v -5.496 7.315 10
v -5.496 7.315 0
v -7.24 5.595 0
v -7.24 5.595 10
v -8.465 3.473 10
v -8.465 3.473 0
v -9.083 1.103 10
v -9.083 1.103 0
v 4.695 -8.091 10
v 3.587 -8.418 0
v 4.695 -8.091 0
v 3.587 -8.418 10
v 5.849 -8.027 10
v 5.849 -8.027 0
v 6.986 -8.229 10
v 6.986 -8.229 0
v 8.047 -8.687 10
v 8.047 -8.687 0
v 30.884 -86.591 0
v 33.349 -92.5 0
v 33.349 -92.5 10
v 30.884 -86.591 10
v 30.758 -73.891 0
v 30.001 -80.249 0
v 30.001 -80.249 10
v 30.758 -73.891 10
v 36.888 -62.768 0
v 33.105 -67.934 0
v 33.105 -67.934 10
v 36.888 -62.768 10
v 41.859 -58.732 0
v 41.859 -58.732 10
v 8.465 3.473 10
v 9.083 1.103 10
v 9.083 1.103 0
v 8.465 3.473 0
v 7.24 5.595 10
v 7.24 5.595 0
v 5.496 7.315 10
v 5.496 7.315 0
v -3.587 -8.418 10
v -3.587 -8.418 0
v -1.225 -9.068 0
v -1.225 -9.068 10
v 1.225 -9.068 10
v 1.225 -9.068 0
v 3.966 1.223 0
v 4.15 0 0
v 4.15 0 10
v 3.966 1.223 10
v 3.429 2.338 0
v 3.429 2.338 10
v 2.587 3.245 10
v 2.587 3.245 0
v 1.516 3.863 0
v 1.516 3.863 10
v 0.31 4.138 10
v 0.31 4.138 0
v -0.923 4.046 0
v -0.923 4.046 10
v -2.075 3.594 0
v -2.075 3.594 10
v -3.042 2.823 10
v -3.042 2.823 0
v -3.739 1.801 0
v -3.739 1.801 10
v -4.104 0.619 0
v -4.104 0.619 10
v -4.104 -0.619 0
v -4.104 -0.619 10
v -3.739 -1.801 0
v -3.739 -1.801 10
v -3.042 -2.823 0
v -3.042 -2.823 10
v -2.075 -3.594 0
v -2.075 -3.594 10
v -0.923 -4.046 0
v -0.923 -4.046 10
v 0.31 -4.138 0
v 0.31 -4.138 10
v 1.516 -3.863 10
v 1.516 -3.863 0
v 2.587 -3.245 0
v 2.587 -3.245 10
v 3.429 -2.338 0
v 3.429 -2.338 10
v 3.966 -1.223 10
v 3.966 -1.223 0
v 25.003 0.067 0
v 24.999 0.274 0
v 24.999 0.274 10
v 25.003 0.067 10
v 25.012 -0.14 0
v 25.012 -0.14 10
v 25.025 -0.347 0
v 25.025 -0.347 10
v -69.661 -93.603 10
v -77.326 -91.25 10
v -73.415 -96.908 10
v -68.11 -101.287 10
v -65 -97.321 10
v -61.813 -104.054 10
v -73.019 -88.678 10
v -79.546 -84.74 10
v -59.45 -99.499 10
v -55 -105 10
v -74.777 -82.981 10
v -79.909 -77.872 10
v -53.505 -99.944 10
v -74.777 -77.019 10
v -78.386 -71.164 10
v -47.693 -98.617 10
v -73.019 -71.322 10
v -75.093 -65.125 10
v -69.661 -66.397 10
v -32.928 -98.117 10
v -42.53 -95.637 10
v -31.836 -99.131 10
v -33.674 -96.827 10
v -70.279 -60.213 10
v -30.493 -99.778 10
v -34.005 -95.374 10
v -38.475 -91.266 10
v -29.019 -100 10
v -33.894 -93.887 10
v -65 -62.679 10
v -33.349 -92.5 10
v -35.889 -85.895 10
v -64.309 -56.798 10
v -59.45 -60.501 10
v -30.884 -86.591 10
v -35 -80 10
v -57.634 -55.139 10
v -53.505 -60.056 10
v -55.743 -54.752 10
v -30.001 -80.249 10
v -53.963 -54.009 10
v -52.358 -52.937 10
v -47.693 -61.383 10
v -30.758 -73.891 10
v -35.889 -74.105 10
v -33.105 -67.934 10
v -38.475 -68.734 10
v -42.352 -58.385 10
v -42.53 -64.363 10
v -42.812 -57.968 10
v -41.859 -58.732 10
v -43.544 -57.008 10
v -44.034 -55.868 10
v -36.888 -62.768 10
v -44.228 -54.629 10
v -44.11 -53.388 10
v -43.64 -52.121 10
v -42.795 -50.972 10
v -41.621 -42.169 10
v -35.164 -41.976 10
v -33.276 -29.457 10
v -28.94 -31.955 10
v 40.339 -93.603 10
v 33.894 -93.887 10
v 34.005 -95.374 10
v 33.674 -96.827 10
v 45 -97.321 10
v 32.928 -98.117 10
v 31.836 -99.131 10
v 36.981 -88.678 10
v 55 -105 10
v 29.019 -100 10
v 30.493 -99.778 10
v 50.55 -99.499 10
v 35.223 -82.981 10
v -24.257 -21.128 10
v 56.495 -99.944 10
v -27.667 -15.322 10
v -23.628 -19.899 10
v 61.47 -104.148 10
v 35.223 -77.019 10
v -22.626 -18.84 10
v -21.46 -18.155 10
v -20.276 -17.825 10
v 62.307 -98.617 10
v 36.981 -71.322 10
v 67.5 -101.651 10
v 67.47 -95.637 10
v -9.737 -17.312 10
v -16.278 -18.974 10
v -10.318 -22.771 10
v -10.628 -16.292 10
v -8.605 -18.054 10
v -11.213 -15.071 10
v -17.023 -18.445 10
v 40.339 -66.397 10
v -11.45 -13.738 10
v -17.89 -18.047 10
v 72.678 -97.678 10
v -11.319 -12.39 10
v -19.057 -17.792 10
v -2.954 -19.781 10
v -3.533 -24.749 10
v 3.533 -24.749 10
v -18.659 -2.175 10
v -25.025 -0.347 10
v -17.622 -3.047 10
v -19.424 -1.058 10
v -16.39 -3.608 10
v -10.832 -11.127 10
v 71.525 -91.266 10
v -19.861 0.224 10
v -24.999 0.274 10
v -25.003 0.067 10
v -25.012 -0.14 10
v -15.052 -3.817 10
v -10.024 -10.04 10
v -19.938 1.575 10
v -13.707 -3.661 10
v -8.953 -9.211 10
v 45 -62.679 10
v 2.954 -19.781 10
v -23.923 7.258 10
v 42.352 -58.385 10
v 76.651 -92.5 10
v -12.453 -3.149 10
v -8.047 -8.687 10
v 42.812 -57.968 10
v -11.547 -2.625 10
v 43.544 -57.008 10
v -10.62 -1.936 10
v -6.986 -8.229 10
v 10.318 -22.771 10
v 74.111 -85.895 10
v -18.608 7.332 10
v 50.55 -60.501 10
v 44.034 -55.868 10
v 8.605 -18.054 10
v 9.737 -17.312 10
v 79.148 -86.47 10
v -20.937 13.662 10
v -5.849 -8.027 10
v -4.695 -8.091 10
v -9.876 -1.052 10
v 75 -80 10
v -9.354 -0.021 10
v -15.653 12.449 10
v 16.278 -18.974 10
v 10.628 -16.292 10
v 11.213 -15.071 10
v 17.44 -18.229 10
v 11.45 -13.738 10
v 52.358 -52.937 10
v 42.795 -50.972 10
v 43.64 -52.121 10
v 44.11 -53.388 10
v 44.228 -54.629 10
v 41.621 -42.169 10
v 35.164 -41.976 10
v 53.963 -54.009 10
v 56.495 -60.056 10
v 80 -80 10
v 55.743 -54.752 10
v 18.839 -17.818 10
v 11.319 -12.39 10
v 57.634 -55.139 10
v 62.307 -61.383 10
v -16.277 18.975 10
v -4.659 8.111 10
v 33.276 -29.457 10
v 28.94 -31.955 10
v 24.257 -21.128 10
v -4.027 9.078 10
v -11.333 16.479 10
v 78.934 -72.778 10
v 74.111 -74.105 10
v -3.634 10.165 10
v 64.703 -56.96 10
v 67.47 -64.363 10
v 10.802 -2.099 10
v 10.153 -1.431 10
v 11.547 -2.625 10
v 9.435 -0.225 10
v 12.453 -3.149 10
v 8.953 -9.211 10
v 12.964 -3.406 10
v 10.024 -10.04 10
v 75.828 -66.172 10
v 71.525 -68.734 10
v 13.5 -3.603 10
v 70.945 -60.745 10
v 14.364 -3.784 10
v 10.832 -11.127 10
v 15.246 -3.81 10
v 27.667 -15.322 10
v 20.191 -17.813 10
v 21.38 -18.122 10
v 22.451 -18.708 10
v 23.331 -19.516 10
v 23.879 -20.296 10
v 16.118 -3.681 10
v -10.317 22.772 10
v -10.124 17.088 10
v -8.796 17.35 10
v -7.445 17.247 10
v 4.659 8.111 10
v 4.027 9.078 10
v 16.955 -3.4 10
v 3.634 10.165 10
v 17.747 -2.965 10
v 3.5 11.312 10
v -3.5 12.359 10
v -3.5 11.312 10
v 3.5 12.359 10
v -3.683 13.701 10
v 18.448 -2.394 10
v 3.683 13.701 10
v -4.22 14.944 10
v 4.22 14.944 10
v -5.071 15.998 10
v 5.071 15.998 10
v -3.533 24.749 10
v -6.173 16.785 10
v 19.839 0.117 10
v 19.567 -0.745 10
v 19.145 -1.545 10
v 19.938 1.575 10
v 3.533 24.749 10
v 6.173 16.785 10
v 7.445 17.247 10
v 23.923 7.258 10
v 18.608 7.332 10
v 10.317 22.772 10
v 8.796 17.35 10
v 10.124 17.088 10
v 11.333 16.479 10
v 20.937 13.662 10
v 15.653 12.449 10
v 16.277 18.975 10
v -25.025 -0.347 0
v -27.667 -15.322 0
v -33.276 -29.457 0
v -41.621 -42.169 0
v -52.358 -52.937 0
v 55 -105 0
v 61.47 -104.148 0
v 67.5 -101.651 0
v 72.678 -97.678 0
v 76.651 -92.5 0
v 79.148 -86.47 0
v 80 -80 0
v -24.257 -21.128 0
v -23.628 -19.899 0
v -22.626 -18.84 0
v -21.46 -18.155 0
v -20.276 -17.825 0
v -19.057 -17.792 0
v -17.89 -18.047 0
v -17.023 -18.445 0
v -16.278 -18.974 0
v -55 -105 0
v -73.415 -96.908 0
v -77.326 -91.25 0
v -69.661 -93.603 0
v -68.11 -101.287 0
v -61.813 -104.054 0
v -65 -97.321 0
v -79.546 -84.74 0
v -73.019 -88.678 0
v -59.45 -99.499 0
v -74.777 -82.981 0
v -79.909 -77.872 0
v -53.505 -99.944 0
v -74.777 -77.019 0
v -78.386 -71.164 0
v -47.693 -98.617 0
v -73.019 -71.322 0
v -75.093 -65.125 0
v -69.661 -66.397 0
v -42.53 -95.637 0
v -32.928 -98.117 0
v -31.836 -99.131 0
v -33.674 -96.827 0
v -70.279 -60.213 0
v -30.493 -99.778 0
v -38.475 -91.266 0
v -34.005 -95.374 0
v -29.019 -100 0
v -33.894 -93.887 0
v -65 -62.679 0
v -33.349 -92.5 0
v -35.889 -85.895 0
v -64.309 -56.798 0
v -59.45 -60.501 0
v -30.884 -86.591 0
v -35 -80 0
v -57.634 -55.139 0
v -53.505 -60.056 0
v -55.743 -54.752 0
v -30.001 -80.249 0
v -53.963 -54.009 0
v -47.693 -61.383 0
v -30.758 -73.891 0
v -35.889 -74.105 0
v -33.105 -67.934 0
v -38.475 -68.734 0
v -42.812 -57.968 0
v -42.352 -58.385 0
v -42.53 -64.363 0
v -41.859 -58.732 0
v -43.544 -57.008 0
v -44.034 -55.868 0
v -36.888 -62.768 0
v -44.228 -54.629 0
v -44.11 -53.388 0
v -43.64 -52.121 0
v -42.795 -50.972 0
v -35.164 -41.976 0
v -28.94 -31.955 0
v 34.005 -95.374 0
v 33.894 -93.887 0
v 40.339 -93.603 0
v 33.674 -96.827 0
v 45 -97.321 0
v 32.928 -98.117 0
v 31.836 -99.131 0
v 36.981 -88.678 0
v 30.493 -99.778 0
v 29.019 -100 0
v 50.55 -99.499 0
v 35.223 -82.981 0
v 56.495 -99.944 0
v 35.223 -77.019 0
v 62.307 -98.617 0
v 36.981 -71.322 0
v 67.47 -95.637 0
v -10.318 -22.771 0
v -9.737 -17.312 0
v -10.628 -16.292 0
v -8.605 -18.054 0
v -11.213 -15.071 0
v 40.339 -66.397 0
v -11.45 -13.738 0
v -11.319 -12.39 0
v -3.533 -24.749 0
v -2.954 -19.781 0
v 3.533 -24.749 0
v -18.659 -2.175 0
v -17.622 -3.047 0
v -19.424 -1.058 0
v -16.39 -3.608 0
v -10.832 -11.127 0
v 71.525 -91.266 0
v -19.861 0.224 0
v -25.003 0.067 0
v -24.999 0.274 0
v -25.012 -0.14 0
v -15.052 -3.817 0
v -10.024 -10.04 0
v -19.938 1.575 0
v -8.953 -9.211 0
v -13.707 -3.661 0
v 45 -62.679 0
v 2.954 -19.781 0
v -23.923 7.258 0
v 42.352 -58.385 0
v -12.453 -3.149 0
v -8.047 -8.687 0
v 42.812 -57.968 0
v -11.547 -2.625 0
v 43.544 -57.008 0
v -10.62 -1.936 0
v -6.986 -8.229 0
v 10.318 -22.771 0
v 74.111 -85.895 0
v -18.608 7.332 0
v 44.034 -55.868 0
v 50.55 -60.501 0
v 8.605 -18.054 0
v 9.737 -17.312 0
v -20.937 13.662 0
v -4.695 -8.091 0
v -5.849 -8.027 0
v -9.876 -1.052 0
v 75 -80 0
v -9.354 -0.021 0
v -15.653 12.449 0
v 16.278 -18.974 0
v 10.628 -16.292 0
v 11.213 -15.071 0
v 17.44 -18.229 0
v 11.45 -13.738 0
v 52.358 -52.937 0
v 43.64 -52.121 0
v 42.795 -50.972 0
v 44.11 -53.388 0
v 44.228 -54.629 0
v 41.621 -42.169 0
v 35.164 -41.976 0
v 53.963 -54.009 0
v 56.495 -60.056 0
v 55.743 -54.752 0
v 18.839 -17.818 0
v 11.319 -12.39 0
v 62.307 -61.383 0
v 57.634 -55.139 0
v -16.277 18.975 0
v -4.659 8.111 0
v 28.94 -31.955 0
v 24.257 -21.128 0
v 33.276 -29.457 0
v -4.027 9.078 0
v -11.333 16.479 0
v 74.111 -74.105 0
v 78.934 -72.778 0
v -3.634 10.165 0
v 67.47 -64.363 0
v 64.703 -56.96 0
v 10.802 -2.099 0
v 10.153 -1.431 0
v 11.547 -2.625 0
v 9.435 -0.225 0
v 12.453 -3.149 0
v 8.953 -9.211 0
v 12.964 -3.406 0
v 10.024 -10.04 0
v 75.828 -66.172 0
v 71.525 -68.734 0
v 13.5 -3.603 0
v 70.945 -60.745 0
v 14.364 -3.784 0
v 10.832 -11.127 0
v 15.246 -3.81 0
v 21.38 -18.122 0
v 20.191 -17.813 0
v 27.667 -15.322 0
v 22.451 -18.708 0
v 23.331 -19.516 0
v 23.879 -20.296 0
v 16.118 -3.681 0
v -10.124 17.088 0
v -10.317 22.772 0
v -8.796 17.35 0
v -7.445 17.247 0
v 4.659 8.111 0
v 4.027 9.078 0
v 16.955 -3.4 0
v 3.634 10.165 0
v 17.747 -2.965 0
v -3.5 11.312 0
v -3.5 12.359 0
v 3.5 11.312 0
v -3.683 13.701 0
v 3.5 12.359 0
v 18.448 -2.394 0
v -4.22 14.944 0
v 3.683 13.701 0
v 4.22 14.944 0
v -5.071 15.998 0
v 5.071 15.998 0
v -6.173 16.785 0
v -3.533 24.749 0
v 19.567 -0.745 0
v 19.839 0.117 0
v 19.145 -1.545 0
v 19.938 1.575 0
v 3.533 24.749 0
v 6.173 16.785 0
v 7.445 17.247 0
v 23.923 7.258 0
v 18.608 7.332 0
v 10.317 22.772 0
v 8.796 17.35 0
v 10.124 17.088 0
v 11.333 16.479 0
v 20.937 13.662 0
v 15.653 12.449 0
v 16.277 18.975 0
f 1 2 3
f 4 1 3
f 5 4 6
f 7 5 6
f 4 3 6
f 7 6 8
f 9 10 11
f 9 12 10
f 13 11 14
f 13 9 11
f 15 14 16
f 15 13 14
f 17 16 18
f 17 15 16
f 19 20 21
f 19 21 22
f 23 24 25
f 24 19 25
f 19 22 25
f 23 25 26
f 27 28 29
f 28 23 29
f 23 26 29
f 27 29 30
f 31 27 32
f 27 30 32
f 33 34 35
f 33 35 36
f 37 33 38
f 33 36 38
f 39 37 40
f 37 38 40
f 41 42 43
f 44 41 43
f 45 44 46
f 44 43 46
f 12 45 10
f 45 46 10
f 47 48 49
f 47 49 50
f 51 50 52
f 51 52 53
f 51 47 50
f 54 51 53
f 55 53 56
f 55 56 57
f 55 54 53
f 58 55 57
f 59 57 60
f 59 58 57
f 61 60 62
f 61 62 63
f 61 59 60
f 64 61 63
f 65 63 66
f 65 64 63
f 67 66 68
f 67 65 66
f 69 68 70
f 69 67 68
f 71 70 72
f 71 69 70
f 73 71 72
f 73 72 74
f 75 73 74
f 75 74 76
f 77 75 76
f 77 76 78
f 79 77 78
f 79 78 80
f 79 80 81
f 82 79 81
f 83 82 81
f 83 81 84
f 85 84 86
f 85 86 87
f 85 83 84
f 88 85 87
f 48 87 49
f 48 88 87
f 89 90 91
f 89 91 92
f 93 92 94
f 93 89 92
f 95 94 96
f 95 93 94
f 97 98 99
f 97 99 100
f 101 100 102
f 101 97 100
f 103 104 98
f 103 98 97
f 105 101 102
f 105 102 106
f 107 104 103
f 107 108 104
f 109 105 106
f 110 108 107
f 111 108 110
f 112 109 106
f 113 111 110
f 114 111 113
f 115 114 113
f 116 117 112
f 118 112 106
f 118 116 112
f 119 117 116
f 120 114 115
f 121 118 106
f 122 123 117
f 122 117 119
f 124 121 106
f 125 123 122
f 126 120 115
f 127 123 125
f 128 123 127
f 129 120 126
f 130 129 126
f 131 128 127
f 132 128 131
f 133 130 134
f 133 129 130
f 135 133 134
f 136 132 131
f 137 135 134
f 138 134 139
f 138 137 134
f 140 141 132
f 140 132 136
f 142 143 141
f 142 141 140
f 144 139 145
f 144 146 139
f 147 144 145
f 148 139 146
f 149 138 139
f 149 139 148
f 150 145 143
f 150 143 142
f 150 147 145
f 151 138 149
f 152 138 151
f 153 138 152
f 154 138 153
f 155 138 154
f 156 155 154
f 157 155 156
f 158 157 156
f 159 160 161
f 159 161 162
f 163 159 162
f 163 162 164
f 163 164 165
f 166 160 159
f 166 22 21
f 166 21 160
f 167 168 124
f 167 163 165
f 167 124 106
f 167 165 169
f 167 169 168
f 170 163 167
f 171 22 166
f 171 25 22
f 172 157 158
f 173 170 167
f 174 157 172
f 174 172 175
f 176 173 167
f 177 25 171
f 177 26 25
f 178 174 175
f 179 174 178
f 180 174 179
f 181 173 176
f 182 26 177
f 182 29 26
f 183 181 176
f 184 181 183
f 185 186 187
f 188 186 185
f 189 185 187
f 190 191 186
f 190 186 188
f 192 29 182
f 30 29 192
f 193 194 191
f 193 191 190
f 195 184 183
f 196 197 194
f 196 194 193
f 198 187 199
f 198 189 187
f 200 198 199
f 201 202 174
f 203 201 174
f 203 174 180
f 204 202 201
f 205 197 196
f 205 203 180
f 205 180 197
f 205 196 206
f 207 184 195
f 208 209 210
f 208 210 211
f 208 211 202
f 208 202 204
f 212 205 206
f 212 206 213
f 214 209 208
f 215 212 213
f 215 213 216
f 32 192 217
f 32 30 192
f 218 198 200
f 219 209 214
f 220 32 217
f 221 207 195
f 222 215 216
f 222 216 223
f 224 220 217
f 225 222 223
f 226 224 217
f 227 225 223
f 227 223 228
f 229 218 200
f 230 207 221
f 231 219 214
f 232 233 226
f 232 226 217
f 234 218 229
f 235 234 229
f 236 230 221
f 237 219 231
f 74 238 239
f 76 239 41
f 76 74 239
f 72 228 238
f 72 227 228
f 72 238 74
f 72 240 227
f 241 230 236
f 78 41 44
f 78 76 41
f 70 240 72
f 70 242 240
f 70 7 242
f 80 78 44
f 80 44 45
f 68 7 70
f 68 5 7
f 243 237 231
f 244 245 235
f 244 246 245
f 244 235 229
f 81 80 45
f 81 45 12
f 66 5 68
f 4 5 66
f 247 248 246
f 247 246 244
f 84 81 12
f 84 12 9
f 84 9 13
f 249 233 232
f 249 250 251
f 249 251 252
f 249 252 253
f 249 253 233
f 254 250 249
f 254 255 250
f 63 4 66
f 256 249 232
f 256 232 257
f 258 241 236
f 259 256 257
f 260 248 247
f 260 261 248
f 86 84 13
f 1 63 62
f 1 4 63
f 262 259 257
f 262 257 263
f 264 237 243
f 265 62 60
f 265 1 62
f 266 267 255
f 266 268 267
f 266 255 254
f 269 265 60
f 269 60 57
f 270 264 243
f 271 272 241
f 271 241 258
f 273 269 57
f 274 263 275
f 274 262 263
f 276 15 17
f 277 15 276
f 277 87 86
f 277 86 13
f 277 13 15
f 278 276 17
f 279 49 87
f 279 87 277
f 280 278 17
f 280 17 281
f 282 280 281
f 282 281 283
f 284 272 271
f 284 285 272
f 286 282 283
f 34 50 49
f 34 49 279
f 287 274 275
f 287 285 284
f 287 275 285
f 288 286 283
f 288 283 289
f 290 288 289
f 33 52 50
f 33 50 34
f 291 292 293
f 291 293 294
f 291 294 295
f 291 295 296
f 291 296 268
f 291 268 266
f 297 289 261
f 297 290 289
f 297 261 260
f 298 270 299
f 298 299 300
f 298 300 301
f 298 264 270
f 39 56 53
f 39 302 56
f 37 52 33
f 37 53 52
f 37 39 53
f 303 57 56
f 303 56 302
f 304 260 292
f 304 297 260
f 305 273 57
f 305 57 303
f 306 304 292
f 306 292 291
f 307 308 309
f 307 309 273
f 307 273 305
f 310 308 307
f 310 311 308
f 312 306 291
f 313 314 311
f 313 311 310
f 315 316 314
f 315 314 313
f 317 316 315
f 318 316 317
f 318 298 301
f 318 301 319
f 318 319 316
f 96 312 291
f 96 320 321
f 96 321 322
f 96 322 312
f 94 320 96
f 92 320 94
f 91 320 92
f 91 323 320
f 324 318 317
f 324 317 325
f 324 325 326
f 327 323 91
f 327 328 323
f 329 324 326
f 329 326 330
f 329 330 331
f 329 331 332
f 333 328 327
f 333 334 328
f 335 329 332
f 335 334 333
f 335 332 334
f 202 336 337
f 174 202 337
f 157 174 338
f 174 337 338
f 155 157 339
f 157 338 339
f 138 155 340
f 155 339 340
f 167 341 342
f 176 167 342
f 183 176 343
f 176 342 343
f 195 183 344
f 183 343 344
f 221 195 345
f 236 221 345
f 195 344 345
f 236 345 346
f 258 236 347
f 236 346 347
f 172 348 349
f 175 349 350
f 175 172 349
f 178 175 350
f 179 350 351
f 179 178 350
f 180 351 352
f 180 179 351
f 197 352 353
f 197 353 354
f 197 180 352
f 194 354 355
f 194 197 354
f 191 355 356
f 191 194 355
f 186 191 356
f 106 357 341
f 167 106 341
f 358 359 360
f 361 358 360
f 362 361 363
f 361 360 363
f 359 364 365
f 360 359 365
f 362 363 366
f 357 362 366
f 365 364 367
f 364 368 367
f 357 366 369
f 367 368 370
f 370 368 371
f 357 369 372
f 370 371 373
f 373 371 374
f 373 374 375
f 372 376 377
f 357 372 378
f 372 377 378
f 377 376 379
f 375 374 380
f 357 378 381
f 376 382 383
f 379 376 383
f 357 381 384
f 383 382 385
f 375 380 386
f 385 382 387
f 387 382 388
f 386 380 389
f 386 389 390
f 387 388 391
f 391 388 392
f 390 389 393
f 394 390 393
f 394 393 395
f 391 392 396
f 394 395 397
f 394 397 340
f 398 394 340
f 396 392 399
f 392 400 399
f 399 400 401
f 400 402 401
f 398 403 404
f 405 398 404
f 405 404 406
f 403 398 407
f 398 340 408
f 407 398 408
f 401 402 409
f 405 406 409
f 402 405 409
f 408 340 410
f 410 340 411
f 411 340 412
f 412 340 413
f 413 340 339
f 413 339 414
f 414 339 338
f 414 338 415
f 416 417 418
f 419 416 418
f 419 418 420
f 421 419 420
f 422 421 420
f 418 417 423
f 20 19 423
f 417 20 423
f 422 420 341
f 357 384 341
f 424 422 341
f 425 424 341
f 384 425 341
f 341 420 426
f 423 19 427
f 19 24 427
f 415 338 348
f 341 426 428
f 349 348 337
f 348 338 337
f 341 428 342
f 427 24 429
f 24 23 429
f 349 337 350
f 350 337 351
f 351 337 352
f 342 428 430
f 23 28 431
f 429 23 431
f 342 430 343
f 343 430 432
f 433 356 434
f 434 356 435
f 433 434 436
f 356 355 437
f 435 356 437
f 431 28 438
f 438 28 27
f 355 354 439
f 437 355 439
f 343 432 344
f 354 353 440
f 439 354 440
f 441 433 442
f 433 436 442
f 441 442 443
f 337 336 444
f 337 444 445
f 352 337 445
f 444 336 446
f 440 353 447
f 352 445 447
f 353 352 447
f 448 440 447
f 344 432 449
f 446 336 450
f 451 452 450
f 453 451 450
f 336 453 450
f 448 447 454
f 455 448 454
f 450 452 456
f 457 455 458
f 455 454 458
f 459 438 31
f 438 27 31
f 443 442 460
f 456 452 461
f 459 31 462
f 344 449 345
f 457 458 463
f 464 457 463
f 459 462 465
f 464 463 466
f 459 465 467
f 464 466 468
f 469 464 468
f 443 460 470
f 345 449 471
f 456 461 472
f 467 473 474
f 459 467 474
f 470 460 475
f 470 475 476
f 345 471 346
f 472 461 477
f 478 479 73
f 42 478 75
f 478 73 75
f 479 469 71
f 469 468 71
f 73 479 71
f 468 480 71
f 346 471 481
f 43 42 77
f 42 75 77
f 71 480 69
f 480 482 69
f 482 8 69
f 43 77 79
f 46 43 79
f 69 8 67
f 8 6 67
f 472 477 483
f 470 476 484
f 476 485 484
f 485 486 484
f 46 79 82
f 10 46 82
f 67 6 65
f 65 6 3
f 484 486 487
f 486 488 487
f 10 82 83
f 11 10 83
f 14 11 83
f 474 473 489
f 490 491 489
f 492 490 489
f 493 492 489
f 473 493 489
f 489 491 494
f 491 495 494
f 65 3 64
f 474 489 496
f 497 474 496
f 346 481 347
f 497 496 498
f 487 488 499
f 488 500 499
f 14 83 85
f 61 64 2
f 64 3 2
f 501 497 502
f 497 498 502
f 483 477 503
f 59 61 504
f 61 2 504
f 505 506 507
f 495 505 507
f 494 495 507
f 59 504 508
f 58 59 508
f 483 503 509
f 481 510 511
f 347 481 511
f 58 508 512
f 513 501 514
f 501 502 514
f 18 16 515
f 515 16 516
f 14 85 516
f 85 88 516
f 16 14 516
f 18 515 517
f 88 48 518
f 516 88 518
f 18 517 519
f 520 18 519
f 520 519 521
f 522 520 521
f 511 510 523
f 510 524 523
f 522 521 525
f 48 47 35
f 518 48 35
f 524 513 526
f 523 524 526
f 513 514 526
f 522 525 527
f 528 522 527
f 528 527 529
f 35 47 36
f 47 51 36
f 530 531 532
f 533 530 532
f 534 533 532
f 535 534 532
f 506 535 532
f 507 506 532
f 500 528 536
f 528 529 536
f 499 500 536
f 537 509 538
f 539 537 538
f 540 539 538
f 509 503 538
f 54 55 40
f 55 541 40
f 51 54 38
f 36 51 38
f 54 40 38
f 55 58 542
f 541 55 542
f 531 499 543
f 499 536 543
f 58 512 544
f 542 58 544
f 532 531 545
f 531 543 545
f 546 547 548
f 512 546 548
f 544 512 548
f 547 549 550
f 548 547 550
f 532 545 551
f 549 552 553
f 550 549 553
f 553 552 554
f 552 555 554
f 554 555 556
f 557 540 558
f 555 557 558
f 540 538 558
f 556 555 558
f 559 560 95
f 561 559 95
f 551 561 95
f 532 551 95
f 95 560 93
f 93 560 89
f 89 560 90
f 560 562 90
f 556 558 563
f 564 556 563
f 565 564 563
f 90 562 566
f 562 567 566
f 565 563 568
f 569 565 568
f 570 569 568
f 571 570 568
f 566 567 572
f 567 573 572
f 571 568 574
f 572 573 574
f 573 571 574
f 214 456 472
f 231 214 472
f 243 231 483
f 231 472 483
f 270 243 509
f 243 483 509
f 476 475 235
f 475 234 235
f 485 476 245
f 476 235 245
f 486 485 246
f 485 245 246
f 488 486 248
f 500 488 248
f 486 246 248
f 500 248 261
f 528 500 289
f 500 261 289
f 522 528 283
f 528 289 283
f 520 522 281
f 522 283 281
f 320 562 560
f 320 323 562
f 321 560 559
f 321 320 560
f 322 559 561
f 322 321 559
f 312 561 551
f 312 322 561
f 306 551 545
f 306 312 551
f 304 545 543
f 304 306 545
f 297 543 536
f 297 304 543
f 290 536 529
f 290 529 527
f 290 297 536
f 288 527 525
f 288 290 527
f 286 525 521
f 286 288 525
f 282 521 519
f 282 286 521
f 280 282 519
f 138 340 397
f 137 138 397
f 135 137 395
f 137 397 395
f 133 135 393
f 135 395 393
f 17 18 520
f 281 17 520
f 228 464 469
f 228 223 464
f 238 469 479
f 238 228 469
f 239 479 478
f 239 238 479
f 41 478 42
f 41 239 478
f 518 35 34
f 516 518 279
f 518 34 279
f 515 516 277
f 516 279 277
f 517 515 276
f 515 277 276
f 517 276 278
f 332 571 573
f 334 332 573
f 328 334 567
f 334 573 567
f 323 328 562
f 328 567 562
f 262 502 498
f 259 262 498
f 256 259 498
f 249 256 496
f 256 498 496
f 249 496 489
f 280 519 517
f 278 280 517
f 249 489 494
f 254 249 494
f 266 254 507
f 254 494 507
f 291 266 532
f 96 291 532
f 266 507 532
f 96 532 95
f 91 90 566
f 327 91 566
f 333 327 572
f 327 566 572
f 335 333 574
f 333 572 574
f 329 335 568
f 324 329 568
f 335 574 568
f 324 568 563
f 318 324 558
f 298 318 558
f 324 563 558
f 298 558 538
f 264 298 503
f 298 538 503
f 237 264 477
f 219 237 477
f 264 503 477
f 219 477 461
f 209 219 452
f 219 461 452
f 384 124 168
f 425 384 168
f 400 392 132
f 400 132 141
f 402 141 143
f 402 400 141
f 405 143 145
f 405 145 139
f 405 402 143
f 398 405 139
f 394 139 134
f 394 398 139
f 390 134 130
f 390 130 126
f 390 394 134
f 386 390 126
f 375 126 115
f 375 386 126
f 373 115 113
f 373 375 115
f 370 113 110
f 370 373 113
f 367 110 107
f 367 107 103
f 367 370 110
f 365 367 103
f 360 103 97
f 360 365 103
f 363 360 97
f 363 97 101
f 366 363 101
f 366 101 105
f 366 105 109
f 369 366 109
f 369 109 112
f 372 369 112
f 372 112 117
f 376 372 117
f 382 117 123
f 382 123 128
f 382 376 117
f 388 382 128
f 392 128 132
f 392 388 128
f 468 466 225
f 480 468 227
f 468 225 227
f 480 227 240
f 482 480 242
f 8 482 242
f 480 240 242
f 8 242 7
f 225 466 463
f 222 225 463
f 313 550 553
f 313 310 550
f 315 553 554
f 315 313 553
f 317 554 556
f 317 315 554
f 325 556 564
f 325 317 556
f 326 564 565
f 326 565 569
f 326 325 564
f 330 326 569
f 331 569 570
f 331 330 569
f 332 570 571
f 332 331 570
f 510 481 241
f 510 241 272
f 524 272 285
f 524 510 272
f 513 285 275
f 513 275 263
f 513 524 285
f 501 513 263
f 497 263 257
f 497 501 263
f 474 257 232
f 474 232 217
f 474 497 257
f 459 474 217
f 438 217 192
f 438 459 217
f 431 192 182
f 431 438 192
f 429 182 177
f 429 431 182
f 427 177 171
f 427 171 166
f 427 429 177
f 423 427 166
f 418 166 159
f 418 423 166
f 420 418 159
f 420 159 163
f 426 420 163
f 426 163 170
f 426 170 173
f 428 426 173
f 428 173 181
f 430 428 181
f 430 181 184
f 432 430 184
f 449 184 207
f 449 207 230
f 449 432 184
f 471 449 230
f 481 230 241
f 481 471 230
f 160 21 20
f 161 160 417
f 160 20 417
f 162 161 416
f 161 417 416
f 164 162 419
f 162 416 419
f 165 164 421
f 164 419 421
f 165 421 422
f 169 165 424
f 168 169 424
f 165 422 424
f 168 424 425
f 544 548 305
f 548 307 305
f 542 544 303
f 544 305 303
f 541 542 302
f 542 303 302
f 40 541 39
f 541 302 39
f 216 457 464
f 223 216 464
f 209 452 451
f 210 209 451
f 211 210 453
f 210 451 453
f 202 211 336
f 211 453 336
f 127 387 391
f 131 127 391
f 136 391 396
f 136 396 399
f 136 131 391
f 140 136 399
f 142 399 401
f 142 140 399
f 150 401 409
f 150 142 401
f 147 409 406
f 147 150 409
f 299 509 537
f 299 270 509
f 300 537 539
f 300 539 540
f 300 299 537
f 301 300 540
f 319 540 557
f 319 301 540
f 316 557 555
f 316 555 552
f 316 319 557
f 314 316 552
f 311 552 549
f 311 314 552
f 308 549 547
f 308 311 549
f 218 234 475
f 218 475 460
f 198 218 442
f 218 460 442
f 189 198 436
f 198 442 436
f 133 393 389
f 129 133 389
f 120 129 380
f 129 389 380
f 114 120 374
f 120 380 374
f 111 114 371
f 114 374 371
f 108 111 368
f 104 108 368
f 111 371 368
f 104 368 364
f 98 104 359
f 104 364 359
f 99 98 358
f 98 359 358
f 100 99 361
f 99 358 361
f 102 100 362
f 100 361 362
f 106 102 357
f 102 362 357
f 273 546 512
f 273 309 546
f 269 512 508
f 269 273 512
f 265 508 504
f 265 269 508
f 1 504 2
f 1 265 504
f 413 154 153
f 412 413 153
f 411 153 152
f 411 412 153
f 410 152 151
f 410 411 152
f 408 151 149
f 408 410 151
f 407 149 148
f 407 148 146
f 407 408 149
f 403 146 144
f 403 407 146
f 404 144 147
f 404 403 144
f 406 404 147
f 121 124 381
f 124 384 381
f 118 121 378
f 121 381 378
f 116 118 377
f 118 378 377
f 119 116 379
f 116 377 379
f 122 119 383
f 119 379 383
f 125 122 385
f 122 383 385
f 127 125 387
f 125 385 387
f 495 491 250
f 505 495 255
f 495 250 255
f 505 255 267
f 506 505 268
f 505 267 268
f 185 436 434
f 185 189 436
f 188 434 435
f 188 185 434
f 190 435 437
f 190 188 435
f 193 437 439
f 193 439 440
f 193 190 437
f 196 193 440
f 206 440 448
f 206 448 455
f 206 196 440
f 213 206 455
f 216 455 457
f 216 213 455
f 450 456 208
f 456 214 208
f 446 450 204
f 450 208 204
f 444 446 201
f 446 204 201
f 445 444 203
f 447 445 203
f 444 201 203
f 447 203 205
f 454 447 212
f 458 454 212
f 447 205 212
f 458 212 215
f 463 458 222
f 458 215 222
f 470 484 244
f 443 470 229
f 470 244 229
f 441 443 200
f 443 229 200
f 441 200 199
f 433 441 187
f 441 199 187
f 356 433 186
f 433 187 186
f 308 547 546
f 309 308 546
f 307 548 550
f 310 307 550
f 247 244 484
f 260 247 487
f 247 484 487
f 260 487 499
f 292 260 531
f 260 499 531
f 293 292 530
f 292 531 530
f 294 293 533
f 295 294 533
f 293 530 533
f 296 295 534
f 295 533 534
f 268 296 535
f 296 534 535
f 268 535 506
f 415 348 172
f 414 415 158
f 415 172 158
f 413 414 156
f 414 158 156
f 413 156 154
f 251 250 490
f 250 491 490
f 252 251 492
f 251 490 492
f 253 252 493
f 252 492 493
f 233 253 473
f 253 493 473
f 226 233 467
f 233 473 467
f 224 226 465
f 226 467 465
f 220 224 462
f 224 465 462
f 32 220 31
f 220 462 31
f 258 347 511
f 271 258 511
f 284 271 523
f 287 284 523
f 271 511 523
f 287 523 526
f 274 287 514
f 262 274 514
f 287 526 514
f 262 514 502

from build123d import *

# Parameters (mm, degrees)
F1_R            = 20
F2_DEPTH        = 10
F3_T            = -5
F4_DEPTH        = 5.001
F1_R_2          = 4.15
F5_DEPTH        = 10
F6_DEPTH        = 10
F6_COPIES_COUNT = 3
F9_R            = 5
F10_T1_DEPTH    = 10
F11_R           = 5


# Not quite as in the source:
# - a fillet or chamfer that OpenCascade refuses, or shapes differently, is made with other operations: its cross-section is extruded or revolved along the edge and cut away or added
# - a feature of the source that left no trace in its solid (it failed there, or was rolled back) is left out
# - a pattern or mirror of a feature is missing from the dataset's text; its kind, count and spacing are read off the source's solid


with BuildPart() as f2:
    # F1 (on Top) → F2 (new body)
    with BuildSketch(Plane.XY):
        with BuildLine():
            ThreePointArc((-25, 0), (0, -25), (25, 0))
            ThreePointArc((25, 0), (0, 25), (-25, 0))
        make_face()
        with BuildLine():
            ThreePointArc((3.5, 19.6913686675), (15.3297097168, 12.8452325787), (20, 0))
            ThreePointArc((20, 0), (-12.8452325787, -15.3297097168), (-3.5, 19.6913686675))
            ThreePointArc((-3.5, 19.6913686675), (0, 20), (3.5, 19.6913686675))
        make_face(mode=Mode.SUBTRACT)
        with BuildLine():
            ThreePointArc((55, -55), (33.982083659, -30.7824998224), (25, 0))
            ThreePointArc((25, 0), (0, -25), (-25, 0))
            ThreePointArc((-25, 0), (-33.982083659, -30.7824998224), (-55, -55))
            ThreePointArc((-55, -55), (-37.3223304703, -62.3223304703), (-30, -80))
            ThreePointArc((-30, -80), (-37.3223304703, -97.6776695297), (-55, -105))
            Line((-55, -105), (55, -105))
            ThreePointArc((55, -105), (30, -80), (55, -55))
        make_face()
        with BuildLine():
            ThreePointArc((80, -80), (72.6776695297, -62.3223304703), (55, -55))
            ThreePointArc((55, -55), (30, -80), (55, -105))
            ThreePointArc((55, -105), (72.6776695297, -97.6776695297), (80, -80))
        make_face()
        with Locations((55, -80)):
            Circle(F1_R, mode=Mode.SUBTRACT)
        with BuildLine():
            ThreePointArc((-30, -80), (-37.3223304703, -62.3223304703), (-55, -55))
            ThreePointArc((-55, -55), (-80, -80), (-55, -105))
            ThreePointArc((-55, -105), (-37.3223304703, -97.6776695297), (-30, -80))
        make_face()
        with Locations((-55, -80)):
            Circle(F1_R, mode=Mode.SUBTRACT)
    extrude(amount=F2_DEPTH)

    # F3
    f3_openings = [f2.faces().sort_by_distance(p)[0] for p in [
        (0, -59.438768, 10),
    ]]
    offset(amount=F3_T, openings=f3_openings)

    # F4 (cut, through all): a face of the model
    f4_faces = [f2.faces().sort_by_distance(p)[0] for p in [
        (0, -60.9945168835, 5),
    ]]
    extrude(f4_faces, amount=-F4_DEPTH, mode=Mode.SUBTRACT)



with BuildPart() as f5:
    # F1 (on Top) → F5 (new body, through all)
    with BuildSketch(Plane.XY):
        with BuildLine():
            ThreePointArc((9.15, 0), (7.6074798718, 5.0841665984), (3.5, 8.4541409972))
            ThreePointArc((3.5, 8.4541409972), (0, 9.15), (-3.5, 8.4541409972))
            ThreePointArc((-3.5, 8.4541409972), (-5.0841665984, -7.6074798718), (9.15, 0))
        make_face()
        Circle(F1_R_2, mode=Mode.SUBTRACT)
    extrude(amount=F5_DEPTH)


with BuildPart() as f2_1:
    add(f2.part)

    add(f5.part)  # F6 merges F5
    # F1 (on Top) → F6 (join, through all)
    with BuildSketch(Plane.XY):
        with BuildLine():
            Line((3.5, 8.4541409972), (3.5, 19.6913686675))
            ThreePointArc((3.5, 19.6913686675), (0, 20), (-3.5, 19.6913686675))
            Line((-3.5, 19.6913686675), (-3.5, 8.4541409972))
            ThreePointArc((-3.5, 8.4541409972), (0, 9.15), (3.5, 8.4541409972))
        make_face()
    f6 = extrude(amount=F6_DEPTH)

    # F6_copies: F6 ×3 about axis
    f6_copies_axis = Axis((0, 0, 0), (0, 0, 1))
    for i in range(1, F6_COPIES_COUNT):
        add(f6.rotate(f6_copies_axis, i * 360 / F6_COPIES_COUNT))

    # F9
    f9_edges = [f2_1.edges().sort_by_distance(p)[0] for p in [
        (3.5, 8.454141, 5),
        (3.5, 19.691369, 5),
        (-3.5, 8.454141, 5),
        (-3.5, 19.691369, 5),
    ]]
    fillet(f9_edges, radius=F9_R)

    # F10: fillet of radius 10 on 4 edges, made by hand

    # F10_s2 → F10_t1 (join)
    with BuildSketch(Plane.XY):
        with BuildLine():
            ThreePointArc((57.6335213289, -55.1390956438), (54.8351268274, -54.4231472749), (52.358111127, -52.9372175751))
            ThreePointArc((52.358111127, -52.9372175751), (53.6675306909, -53.9833691579), (55, -55))
            ThreePointArc((55, -55), (56.3185960515, -55.0347981291), (57.6335213289, -55.1390956438))
        make_face()
        with BuildLine():
            ThreePointArc((-52.358111127, -52.9372175751), (-54.8351268274, -54.4231472749), (-57.6335213289, -55.1390956438))
            ThreePointArc((-57.6335213289, -55.1390956438), (-56.3185960515, -55.0347981291), (-55, -55))
            ThreePointArc((-55, -55), (-53.6675306909, -53.9833691579), (-52.358111127, -52.9372175751))
        make_face()
        with BuildLine():
            ThreePointArc((-24.9985005196, 0.2738097395), (-25.0067330939, -0.0368678872), (-25.0246159735, -0.3471396482))
            ThreePointArc((-25.0246159735, -0.3471396482), (-25.0121066389, -0.1735841019), (-25, 0))
            ThreePointArc((-25, 0), (-24.9996251271, 0.1369069227), (-24.9985005196, 0.2738097395))
        make_face()
        with BuildLine():
            ThreePointArc((24.9985005196, 0.2738097395), (25.0067330939, -0.0368678872), (25.0246159735, -0.3471396482))
            ThreePointArc((25.0246159735, -0.3471396482), (25.0121066389, -0.1735841019), (25, 0))
            ThreePointArc((25, 0), (24.9996251271, 0.1369069227), (24.9985005196, 0.2738097395))
        make_face()
    extrude(amount=F10_T1_DEPTH)

    # F11
    f11_edges = [f2_1.edges().sort_by_distance(p)[0] for p in [
        (9.071501, -1.195982, 5),
        (18.803226, -6.814595, 5),
        (-5.571501, -7.258159, 5),
        (5.571501, -7.258159, 5),
        (15.303226, -12.876773, 5),
        (-15.303226, -12.876773, 5),
        (21.751654, -12.323374, 5),
        (48.164428, -55.952652, 5),
        (40, -100, 5),
        (-40, -100, 5),
        (-48.164428, -55.952652, 5),
        (-21.751654, -12.323374, 5),
        (-9.071501, -1.195982, 5),
        (-18.803226, -6.814595, 5),
    ]]
    fillet(f11_edges, radius=F11_R)


solid = f2_1.part
